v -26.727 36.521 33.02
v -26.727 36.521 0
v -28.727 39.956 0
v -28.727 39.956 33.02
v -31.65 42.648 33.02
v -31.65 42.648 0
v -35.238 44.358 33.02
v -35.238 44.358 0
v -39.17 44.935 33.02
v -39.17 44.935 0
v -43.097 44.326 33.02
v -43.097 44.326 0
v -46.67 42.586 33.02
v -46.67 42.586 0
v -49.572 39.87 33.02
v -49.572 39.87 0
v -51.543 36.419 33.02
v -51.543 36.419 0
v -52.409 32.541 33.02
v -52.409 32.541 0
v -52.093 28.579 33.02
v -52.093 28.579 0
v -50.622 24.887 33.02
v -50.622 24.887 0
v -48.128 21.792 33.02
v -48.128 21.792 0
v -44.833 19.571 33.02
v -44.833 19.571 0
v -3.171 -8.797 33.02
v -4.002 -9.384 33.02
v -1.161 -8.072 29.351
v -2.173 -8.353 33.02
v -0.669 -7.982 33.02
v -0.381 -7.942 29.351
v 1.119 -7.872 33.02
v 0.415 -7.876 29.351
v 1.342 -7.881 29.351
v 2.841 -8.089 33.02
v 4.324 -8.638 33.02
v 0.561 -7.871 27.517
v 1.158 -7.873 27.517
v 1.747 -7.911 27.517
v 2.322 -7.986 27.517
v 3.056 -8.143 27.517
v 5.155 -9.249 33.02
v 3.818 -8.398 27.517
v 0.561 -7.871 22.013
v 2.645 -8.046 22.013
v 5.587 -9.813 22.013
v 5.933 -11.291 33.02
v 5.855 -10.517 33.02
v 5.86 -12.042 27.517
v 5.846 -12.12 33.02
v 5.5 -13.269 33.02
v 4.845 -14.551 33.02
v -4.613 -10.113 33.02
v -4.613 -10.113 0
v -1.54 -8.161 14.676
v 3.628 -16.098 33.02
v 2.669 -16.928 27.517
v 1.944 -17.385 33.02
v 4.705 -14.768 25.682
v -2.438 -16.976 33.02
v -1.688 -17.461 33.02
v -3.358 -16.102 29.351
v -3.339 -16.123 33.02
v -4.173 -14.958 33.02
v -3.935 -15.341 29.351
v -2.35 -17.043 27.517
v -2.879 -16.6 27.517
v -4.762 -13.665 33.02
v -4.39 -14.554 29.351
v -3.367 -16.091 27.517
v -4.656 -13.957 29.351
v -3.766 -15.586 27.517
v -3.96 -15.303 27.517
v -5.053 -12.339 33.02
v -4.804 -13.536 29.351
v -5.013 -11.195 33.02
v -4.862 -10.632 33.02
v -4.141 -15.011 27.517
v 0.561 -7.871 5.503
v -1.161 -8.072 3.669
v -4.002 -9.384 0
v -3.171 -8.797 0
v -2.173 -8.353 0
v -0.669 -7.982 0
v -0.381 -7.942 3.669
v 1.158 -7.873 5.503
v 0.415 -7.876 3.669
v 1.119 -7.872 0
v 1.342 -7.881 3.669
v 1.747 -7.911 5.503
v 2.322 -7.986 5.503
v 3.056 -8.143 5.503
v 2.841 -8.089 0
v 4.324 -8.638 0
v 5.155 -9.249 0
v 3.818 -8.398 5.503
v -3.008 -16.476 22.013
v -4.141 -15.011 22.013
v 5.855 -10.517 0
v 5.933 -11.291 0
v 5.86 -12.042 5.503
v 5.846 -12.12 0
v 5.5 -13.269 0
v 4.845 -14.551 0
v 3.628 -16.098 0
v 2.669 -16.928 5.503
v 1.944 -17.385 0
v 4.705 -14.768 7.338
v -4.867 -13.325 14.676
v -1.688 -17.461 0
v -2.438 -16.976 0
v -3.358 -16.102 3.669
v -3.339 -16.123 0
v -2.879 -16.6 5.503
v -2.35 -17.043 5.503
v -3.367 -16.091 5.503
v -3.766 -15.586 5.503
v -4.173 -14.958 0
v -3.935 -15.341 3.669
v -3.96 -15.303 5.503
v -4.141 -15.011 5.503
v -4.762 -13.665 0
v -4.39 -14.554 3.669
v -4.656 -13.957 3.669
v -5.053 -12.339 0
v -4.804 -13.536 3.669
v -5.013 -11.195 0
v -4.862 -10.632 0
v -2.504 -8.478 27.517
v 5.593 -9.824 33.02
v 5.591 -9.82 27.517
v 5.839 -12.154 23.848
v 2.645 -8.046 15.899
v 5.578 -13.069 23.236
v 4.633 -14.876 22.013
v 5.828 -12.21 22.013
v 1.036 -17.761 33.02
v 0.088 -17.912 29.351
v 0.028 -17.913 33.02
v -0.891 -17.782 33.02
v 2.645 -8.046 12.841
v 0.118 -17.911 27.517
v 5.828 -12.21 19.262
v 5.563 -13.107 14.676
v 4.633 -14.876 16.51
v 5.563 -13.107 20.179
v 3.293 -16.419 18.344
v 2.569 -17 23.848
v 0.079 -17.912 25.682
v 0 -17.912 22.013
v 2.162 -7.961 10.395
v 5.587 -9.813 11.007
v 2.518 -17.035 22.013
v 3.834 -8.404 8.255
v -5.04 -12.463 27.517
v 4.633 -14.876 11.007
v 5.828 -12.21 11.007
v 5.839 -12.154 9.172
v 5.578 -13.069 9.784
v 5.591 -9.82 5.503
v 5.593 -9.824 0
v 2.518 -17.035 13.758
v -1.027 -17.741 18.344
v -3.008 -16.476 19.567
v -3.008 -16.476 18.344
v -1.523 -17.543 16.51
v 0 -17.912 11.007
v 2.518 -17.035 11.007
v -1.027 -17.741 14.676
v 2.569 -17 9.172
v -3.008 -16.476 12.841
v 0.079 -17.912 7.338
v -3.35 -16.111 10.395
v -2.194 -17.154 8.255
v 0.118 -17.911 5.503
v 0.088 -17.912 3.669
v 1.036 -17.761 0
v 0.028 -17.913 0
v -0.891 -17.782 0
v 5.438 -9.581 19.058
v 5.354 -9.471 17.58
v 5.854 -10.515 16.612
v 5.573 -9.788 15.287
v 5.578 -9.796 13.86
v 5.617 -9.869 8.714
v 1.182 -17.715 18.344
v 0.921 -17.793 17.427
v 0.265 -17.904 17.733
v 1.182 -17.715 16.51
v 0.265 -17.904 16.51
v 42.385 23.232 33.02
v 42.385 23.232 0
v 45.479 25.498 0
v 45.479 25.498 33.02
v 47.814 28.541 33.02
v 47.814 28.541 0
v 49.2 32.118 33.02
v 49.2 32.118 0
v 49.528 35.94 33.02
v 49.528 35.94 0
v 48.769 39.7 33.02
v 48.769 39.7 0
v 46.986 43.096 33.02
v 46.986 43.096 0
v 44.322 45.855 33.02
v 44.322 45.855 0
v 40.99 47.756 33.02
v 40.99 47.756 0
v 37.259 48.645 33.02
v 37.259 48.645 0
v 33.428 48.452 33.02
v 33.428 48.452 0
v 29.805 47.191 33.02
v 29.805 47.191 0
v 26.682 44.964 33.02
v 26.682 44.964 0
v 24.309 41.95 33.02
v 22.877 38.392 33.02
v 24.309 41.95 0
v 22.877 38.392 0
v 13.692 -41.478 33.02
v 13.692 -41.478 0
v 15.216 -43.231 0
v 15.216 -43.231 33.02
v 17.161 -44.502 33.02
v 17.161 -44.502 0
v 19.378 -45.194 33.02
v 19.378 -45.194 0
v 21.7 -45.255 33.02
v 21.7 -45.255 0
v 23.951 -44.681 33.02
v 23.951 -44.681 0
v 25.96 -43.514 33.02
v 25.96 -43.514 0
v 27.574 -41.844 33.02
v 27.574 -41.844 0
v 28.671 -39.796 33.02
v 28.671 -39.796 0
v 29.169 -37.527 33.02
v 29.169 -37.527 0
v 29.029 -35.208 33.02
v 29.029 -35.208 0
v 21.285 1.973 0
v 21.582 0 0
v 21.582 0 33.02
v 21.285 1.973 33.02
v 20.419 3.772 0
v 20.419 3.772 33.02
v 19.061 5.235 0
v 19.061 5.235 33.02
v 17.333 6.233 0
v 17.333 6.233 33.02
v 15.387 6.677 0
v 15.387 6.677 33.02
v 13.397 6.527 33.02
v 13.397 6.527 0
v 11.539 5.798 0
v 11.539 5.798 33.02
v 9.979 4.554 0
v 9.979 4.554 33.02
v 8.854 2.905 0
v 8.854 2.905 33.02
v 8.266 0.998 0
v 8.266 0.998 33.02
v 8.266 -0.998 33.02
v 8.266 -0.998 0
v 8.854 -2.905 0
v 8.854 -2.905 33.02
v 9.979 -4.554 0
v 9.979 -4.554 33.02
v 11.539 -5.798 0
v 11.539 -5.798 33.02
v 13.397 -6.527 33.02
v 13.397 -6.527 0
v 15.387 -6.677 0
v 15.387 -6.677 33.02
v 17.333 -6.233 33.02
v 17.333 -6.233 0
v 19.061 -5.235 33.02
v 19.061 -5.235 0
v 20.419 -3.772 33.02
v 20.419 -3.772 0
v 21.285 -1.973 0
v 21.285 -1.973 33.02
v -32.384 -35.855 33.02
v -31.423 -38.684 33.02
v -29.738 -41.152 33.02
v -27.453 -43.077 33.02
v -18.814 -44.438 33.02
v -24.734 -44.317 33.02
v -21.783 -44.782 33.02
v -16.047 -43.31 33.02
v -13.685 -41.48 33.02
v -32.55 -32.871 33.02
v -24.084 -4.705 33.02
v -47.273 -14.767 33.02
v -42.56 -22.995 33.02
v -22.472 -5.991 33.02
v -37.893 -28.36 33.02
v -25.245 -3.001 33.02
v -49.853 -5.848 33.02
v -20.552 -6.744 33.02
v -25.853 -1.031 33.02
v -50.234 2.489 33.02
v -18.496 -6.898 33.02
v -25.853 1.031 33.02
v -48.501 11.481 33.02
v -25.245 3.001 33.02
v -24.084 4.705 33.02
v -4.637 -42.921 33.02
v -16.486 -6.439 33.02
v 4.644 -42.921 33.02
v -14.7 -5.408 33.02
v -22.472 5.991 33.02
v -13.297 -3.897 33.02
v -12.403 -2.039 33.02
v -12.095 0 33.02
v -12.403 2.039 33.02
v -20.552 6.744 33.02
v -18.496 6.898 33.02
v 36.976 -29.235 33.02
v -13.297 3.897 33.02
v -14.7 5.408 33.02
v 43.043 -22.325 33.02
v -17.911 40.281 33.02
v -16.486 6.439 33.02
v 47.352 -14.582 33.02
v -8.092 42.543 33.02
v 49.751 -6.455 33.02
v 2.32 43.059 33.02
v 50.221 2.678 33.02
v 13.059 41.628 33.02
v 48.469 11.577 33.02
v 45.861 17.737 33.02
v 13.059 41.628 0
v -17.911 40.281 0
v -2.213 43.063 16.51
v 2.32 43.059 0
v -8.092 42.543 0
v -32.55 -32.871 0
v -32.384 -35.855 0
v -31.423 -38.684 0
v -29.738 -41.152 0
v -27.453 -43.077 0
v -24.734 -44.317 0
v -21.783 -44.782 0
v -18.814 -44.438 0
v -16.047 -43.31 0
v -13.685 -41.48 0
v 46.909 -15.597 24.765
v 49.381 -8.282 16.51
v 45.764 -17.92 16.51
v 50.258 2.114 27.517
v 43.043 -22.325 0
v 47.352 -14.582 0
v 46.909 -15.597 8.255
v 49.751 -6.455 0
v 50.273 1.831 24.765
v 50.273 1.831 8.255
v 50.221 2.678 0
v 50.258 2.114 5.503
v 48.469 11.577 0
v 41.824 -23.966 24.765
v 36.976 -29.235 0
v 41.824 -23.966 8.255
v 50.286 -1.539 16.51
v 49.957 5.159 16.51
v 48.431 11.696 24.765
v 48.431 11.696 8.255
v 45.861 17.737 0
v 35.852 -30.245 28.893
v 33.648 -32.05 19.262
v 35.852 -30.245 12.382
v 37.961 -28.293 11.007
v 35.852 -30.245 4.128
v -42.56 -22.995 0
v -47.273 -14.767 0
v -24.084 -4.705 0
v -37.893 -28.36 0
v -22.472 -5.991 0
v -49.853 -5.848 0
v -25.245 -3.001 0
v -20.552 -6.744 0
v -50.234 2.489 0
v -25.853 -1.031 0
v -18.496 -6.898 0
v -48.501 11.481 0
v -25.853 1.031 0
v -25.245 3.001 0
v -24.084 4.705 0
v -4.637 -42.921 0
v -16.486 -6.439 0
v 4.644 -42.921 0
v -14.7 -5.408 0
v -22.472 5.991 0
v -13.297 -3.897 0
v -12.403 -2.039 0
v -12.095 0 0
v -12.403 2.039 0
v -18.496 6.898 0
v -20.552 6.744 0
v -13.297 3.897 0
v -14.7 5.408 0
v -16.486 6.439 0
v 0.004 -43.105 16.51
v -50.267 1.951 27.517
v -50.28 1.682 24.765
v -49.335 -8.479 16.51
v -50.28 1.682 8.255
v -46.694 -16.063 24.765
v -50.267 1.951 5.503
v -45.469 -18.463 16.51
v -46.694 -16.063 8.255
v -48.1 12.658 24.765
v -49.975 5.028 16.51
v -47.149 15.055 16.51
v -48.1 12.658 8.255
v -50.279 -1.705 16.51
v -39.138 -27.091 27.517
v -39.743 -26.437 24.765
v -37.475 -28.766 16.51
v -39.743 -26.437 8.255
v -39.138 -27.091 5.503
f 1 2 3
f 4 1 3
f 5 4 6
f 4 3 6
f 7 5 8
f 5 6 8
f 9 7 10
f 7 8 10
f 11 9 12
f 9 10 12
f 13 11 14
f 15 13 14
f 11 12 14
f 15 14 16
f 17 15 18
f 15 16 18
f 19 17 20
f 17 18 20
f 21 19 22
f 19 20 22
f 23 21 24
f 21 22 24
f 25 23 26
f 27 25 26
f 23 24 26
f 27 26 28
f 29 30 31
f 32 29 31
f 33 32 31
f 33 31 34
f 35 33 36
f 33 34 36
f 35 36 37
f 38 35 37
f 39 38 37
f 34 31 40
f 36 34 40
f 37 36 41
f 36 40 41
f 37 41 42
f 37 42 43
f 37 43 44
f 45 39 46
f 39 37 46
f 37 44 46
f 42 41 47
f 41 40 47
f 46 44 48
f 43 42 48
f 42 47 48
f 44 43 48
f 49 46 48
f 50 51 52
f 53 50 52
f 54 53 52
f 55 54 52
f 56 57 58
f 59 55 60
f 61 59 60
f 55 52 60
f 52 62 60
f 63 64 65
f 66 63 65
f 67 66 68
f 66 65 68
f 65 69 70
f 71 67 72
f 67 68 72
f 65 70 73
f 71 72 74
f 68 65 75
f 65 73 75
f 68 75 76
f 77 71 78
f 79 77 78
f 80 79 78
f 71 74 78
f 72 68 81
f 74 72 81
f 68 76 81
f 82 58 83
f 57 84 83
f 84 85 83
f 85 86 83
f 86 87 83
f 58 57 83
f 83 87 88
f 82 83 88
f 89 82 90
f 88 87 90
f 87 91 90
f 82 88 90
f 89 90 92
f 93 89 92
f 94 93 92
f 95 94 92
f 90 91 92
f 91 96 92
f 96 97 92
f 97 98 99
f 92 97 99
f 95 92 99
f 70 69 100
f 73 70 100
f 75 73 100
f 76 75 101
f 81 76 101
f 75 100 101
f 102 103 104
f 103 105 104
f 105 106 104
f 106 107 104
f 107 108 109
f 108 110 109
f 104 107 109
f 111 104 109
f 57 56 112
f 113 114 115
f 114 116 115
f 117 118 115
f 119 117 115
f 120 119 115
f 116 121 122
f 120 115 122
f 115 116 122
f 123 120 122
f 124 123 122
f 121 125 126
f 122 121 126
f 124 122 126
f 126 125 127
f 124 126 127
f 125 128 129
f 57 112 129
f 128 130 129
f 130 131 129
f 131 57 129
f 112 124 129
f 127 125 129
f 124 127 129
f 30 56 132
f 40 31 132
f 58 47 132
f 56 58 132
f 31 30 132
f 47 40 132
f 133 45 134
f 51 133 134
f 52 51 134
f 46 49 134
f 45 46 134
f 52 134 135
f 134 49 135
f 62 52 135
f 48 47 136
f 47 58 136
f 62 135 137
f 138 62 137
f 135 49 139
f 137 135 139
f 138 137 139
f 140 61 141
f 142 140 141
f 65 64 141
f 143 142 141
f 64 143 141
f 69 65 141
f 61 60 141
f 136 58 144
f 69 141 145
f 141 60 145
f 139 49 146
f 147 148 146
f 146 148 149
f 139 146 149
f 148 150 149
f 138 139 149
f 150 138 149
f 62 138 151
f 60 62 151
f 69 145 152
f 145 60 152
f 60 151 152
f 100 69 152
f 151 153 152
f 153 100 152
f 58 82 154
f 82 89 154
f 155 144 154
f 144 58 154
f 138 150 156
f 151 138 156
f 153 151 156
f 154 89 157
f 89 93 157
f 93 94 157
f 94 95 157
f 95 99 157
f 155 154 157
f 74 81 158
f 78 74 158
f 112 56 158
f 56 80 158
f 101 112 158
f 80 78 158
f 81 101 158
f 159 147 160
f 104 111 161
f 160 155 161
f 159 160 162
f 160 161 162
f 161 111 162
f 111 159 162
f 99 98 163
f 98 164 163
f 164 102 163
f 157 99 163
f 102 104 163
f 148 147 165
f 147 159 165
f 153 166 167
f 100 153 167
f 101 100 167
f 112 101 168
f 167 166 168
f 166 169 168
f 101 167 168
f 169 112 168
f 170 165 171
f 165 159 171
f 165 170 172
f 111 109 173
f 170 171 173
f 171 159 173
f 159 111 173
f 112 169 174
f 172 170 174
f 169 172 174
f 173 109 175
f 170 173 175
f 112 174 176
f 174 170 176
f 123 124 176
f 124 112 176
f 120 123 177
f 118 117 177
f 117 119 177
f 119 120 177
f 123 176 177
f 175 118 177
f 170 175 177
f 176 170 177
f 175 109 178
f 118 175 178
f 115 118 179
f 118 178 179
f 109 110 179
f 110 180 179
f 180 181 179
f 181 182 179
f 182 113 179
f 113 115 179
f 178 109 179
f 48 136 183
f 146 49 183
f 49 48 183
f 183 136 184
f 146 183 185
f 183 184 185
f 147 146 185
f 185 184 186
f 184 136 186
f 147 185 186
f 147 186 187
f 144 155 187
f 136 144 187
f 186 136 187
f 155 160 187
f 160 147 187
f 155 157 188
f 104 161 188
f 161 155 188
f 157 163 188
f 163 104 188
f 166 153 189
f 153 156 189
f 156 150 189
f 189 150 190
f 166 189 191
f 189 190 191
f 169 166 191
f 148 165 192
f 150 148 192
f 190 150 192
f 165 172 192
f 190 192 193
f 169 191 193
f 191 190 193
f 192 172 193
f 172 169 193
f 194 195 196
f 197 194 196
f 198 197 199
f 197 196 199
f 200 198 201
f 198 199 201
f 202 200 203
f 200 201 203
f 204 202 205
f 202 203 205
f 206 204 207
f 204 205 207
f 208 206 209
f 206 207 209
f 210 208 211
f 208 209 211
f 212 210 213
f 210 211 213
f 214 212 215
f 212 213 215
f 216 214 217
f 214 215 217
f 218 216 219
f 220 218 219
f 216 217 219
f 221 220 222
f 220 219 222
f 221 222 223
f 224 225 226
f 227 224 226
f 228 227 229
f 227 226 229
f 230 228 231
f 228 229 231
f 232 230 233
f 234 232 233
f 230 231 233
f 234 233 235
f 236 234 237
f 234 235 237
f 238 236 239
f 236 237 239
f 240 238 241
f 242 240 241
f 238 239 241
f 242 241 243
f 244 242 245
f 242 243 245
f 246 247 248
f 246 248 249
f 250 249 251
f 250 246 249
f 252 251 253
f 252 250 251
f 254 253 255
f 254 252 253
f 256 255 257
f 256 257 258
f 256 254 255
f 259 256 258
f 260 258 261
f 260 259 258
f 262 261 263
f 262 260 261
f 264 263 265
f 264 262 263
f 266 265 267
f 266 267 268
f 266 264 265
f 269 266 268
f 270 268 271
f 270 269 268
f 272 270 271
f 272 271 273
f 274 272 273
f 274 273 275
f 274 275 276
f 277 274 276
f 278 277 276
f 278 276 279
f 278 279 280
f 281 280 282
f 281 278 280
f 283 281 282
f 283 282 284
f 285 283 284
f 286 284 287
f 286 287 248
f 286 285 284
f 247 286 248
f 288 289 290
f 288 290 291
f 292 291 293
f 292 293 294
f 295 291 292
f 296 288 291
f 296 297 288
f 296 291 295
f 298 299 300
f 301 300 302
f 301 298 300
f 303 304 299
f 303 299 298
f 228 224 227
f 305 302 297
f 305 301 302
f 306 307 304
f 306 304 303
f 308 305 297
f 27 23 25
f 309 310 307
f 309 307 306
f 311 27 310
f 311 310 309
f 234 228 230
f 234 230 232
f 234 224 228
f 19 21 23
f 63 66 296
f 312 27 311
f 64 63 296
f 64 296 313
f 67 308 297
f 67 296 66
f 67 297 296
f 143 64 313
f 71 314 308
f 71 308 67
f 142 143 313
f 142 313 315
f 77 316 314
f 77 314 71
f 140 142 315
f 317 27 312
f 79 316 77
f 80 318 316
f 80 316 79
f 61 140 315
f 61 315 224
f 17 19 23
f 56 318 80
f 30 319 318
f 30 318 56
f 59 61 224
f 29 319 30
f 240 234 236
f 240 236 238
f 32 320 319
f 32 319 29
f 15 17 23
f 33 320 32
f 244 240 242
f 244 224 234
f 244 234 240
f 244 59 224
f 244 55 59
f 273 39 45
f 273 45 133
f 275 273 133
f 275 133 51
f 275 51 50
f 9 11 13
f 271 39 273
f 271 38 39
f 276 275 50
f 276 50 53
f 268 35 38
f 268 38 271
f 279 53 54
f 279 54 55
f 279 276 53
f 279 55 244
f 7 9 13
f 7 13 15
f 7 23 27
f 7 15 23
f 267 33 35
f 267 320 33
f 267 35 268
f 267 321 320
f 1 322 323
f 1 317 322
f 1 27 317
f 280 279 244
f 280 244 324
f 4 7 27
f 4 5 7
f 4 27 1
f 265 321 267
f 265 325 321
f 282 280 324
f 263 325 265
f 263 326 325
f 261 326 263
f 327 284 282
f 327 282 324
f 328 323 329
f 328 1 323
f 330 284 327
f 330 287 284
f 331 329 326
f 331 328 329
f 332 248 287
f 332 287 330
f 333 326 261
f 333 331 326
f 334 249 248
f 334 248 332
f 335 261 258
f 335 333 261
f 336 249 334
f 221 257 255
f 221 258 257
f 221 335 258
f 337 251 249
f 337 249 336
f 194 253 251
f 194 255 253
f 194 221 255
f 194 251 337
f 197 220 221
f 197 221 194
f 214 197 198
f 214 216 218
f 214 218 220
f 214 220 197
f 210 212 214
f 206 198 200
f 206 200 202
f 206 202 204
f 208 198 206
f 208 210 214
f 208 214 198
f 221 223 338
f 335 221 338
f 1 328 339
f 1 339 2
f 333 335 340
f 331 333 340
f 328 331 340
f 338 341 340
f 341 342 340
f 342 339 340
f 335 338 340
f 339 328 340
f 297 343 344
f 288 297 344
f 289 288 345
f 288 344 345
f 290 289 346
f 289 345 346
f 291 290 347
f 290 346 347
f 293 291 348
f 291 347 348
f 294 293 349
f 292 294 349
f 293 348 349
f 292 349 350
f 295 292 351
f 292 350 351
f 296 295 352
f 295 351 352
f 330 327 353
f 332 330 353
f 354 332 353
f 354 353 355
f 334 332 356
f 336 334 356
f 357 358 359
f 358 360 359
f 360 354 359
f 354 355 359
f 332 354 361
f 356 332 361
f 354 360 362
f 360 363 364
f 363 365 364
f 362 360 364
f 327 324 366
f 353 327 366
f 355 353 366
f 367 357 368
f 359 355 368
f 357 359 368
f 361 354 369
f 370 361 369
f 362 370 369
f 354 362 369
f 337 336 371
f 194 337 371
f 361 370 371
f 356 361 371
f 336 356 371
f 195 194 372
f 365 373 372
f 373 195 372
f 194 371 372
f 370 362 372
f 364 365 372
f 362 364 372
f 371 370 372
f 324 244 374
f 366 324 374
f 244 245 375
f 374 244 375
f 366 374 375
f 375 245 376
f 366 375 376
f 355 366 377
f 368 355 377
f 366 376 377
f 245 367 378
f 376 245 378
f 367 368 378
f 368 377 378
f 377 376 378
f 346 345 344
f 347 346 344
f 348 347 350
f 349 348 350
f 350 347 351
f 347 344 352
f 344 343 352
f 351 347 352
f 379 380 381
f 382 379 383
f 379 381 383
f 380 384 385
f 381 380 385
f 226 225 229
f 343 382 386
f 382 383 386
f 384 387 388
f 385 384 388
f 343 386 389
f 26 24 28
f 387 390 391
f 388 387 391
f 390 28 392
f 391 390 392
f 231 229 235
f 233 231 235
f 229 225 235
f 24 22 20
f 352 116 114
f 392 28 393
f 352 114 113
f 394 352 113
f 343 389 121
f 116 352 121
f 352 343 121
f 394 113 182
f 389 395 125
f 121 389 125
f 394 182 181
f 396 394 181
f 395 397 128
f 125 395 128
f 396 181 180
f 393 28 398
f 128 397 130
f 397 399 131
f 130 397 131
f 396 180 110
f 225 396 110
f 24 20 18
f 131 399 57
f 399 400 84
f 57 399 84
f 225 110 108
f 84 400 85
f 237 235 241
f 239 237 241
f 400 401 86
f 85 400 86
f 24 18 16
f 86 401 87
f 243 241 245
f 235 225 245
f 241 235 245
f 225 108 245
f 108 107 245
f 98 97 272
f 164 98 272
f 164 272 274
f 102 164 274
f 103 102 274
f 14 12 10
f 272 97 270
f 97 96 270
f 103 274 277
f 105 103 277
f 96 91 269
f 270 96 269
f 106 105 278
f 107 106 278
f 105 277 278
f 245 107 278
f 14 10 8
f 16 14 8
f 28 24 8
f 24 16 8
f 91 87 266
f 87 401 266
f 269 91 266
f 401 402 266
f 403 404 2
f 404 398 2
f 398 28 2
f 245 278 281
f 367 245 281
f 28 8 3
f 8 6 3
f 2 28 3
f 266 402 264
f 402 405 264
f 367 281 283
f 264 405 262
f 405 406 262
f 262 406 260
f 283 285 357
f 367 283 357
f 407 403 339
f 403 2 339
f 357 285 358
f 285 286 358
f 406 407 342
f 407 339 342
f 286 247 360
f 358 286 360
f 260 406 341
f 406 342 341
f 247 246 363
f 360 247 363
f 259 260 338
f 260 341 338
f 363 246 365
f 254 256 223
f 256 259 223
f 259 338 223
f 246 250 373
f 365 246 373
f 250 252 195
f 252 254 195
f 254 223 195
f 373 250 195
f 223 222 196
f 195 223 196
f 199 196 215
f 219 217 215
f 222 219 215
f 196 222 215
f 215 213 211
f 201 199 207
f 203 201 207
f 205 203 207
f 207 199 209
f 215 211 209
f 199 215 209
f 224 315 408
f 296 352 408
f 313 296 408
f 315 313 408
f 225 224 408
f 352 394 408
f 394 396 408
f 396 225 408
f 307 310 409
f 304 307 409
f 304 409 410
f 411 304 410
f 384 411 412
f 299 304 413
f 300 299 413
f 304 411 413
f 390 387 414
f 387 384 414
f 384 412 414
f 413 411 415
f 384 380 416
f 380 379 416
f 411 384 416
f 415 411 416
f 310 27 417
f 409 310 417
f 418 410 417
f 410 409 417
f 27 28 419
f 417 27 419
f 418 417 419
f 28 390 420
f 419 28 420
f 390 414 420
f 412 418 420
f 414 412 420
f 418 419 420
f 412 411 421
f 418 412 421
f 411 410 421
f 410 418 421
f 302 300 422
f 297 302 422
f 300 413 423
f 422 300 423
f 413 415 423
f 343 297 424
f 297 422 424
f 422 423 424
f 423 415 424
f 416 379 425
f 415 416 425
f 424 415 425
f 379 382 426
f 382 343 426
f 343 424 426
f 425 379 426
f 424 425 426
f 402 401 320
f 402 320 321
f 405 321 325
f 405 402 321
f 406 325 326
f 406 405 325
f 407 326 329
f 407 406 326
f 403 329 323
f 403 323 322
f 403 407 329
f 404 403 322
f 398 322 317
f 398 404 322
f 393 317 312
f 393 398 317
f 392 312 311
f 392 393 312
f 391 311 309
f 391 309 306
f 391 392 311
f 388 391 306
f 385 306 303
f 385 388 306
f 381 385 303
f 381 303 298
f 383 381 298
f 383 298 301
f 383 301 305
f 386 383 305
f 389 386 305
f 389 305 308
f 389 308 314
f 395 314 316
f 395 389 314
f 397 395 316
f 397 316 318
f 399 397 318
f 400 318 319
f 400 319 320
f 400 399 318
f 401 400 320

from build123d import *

# Parameters (mm, degrees)
F0_R     = 6.9174599135
F0_R_2   = 6.6953536728
F1_DEPTH = 33.02


with BuildPart() as f1:
    # F0 (on Top) → F1 (new body)
    with BuildSketch(Plane.XY):
        with BuildLine():
            ThreePointArc((13.6920073452, -41.4780412298), (23.9509627201, -44.6805622966), (29.0285234771, -35.2084620371))
            add(Edge.make_bspline(
                [(29.0285234771, -35.2084620371), (68.2918037486, -11.4532756006), (42.3845917945, 23.2317086668)],
                knots=[5.3273150829, 5.3273150829, 5.3273150829, 6.8523899746, 6.8523899746, 6.8523899746], degree=2, weights=[1, 0.7230855783, 1]))
            ThreePointArc((42.3845917945, 23.2317086668), (44.3217640549, 45.8550598259), (22.8771801048, 38.3919188491))
            add(Edge.make_bspline(
                [(22.8771801048, 38.3919188491), (-2.5443945173, 49.5081889699), (-26.727217642, 36.5211438216)],
                knots=[1.0988176954, 1.0988176954, 1.0988176954, 2.1307691564, 2.1307691564, 2.1307691564], degree=2, weights=[1, 0.8698117268, 1]))
            ThreePointArc((-26.727217642, 36.5211438216), (-48.2228883846, 41.3370667245), (-44.8327850103, 19.5709422832))
            add(Edge.make_bspline(
                [(-44.8327850103, 19.5709422832), (-62.9066905476, -10.8120093087), (-32.5500646686, -32.8710234635)],
                knots=[2.6703042477, 2.6703042477, 2.6703042477, 4.0088984161, 4.0088984161, 4.0088984161], degree=2, weights=[1, 0.7842579731, 1]))
            ThreePointArc((-32.5500646686, -32.8710234635), (-26.1357518543, -43.7893377337), (-13.6851041212, -41.479713))
            add(Edge.make_bspline(
                [(-13.6851041212, -41.479713), (0.0037274647, -44.7938672304), (13.6920073452, -41.4780412298)],
                knots=[4.4369485173, 4.4369485173, 4.4369485173, 4.9879720114, 4.9879720114, 4.9879720114], degree=2, weights=[1, 0.9622861083, 1]))
        make_face()
        with Locations((-19.0128814429, 0)):
            Circle(F0_R, mode=Mode.SUBTRACT)
        with BuildLine():
            add(Edge.make_bspline(
                [(-4.6130437404, -10.112545453), (-2.8805919387, -7.2566060297), (10.8589562819, -6.9282740006), (-0.1500027257, -23.178328073), (-6.2456456393, -12.8038827364), (-4.6130437404, -10.112545453)],
                knots=[0, 0, 0, 0, 0.3419572904, 0.6777514266, 1, 1, 1, 1], degree=3))
        make_face(mode=Mode.SUBTRACT)
        with Locations((14.8867378011, 0)):
            Circle(F0_R_2, mode=Mode.SUBTRACT)
    extrude(amount=F1_DEPTH)


solid = f1.part
